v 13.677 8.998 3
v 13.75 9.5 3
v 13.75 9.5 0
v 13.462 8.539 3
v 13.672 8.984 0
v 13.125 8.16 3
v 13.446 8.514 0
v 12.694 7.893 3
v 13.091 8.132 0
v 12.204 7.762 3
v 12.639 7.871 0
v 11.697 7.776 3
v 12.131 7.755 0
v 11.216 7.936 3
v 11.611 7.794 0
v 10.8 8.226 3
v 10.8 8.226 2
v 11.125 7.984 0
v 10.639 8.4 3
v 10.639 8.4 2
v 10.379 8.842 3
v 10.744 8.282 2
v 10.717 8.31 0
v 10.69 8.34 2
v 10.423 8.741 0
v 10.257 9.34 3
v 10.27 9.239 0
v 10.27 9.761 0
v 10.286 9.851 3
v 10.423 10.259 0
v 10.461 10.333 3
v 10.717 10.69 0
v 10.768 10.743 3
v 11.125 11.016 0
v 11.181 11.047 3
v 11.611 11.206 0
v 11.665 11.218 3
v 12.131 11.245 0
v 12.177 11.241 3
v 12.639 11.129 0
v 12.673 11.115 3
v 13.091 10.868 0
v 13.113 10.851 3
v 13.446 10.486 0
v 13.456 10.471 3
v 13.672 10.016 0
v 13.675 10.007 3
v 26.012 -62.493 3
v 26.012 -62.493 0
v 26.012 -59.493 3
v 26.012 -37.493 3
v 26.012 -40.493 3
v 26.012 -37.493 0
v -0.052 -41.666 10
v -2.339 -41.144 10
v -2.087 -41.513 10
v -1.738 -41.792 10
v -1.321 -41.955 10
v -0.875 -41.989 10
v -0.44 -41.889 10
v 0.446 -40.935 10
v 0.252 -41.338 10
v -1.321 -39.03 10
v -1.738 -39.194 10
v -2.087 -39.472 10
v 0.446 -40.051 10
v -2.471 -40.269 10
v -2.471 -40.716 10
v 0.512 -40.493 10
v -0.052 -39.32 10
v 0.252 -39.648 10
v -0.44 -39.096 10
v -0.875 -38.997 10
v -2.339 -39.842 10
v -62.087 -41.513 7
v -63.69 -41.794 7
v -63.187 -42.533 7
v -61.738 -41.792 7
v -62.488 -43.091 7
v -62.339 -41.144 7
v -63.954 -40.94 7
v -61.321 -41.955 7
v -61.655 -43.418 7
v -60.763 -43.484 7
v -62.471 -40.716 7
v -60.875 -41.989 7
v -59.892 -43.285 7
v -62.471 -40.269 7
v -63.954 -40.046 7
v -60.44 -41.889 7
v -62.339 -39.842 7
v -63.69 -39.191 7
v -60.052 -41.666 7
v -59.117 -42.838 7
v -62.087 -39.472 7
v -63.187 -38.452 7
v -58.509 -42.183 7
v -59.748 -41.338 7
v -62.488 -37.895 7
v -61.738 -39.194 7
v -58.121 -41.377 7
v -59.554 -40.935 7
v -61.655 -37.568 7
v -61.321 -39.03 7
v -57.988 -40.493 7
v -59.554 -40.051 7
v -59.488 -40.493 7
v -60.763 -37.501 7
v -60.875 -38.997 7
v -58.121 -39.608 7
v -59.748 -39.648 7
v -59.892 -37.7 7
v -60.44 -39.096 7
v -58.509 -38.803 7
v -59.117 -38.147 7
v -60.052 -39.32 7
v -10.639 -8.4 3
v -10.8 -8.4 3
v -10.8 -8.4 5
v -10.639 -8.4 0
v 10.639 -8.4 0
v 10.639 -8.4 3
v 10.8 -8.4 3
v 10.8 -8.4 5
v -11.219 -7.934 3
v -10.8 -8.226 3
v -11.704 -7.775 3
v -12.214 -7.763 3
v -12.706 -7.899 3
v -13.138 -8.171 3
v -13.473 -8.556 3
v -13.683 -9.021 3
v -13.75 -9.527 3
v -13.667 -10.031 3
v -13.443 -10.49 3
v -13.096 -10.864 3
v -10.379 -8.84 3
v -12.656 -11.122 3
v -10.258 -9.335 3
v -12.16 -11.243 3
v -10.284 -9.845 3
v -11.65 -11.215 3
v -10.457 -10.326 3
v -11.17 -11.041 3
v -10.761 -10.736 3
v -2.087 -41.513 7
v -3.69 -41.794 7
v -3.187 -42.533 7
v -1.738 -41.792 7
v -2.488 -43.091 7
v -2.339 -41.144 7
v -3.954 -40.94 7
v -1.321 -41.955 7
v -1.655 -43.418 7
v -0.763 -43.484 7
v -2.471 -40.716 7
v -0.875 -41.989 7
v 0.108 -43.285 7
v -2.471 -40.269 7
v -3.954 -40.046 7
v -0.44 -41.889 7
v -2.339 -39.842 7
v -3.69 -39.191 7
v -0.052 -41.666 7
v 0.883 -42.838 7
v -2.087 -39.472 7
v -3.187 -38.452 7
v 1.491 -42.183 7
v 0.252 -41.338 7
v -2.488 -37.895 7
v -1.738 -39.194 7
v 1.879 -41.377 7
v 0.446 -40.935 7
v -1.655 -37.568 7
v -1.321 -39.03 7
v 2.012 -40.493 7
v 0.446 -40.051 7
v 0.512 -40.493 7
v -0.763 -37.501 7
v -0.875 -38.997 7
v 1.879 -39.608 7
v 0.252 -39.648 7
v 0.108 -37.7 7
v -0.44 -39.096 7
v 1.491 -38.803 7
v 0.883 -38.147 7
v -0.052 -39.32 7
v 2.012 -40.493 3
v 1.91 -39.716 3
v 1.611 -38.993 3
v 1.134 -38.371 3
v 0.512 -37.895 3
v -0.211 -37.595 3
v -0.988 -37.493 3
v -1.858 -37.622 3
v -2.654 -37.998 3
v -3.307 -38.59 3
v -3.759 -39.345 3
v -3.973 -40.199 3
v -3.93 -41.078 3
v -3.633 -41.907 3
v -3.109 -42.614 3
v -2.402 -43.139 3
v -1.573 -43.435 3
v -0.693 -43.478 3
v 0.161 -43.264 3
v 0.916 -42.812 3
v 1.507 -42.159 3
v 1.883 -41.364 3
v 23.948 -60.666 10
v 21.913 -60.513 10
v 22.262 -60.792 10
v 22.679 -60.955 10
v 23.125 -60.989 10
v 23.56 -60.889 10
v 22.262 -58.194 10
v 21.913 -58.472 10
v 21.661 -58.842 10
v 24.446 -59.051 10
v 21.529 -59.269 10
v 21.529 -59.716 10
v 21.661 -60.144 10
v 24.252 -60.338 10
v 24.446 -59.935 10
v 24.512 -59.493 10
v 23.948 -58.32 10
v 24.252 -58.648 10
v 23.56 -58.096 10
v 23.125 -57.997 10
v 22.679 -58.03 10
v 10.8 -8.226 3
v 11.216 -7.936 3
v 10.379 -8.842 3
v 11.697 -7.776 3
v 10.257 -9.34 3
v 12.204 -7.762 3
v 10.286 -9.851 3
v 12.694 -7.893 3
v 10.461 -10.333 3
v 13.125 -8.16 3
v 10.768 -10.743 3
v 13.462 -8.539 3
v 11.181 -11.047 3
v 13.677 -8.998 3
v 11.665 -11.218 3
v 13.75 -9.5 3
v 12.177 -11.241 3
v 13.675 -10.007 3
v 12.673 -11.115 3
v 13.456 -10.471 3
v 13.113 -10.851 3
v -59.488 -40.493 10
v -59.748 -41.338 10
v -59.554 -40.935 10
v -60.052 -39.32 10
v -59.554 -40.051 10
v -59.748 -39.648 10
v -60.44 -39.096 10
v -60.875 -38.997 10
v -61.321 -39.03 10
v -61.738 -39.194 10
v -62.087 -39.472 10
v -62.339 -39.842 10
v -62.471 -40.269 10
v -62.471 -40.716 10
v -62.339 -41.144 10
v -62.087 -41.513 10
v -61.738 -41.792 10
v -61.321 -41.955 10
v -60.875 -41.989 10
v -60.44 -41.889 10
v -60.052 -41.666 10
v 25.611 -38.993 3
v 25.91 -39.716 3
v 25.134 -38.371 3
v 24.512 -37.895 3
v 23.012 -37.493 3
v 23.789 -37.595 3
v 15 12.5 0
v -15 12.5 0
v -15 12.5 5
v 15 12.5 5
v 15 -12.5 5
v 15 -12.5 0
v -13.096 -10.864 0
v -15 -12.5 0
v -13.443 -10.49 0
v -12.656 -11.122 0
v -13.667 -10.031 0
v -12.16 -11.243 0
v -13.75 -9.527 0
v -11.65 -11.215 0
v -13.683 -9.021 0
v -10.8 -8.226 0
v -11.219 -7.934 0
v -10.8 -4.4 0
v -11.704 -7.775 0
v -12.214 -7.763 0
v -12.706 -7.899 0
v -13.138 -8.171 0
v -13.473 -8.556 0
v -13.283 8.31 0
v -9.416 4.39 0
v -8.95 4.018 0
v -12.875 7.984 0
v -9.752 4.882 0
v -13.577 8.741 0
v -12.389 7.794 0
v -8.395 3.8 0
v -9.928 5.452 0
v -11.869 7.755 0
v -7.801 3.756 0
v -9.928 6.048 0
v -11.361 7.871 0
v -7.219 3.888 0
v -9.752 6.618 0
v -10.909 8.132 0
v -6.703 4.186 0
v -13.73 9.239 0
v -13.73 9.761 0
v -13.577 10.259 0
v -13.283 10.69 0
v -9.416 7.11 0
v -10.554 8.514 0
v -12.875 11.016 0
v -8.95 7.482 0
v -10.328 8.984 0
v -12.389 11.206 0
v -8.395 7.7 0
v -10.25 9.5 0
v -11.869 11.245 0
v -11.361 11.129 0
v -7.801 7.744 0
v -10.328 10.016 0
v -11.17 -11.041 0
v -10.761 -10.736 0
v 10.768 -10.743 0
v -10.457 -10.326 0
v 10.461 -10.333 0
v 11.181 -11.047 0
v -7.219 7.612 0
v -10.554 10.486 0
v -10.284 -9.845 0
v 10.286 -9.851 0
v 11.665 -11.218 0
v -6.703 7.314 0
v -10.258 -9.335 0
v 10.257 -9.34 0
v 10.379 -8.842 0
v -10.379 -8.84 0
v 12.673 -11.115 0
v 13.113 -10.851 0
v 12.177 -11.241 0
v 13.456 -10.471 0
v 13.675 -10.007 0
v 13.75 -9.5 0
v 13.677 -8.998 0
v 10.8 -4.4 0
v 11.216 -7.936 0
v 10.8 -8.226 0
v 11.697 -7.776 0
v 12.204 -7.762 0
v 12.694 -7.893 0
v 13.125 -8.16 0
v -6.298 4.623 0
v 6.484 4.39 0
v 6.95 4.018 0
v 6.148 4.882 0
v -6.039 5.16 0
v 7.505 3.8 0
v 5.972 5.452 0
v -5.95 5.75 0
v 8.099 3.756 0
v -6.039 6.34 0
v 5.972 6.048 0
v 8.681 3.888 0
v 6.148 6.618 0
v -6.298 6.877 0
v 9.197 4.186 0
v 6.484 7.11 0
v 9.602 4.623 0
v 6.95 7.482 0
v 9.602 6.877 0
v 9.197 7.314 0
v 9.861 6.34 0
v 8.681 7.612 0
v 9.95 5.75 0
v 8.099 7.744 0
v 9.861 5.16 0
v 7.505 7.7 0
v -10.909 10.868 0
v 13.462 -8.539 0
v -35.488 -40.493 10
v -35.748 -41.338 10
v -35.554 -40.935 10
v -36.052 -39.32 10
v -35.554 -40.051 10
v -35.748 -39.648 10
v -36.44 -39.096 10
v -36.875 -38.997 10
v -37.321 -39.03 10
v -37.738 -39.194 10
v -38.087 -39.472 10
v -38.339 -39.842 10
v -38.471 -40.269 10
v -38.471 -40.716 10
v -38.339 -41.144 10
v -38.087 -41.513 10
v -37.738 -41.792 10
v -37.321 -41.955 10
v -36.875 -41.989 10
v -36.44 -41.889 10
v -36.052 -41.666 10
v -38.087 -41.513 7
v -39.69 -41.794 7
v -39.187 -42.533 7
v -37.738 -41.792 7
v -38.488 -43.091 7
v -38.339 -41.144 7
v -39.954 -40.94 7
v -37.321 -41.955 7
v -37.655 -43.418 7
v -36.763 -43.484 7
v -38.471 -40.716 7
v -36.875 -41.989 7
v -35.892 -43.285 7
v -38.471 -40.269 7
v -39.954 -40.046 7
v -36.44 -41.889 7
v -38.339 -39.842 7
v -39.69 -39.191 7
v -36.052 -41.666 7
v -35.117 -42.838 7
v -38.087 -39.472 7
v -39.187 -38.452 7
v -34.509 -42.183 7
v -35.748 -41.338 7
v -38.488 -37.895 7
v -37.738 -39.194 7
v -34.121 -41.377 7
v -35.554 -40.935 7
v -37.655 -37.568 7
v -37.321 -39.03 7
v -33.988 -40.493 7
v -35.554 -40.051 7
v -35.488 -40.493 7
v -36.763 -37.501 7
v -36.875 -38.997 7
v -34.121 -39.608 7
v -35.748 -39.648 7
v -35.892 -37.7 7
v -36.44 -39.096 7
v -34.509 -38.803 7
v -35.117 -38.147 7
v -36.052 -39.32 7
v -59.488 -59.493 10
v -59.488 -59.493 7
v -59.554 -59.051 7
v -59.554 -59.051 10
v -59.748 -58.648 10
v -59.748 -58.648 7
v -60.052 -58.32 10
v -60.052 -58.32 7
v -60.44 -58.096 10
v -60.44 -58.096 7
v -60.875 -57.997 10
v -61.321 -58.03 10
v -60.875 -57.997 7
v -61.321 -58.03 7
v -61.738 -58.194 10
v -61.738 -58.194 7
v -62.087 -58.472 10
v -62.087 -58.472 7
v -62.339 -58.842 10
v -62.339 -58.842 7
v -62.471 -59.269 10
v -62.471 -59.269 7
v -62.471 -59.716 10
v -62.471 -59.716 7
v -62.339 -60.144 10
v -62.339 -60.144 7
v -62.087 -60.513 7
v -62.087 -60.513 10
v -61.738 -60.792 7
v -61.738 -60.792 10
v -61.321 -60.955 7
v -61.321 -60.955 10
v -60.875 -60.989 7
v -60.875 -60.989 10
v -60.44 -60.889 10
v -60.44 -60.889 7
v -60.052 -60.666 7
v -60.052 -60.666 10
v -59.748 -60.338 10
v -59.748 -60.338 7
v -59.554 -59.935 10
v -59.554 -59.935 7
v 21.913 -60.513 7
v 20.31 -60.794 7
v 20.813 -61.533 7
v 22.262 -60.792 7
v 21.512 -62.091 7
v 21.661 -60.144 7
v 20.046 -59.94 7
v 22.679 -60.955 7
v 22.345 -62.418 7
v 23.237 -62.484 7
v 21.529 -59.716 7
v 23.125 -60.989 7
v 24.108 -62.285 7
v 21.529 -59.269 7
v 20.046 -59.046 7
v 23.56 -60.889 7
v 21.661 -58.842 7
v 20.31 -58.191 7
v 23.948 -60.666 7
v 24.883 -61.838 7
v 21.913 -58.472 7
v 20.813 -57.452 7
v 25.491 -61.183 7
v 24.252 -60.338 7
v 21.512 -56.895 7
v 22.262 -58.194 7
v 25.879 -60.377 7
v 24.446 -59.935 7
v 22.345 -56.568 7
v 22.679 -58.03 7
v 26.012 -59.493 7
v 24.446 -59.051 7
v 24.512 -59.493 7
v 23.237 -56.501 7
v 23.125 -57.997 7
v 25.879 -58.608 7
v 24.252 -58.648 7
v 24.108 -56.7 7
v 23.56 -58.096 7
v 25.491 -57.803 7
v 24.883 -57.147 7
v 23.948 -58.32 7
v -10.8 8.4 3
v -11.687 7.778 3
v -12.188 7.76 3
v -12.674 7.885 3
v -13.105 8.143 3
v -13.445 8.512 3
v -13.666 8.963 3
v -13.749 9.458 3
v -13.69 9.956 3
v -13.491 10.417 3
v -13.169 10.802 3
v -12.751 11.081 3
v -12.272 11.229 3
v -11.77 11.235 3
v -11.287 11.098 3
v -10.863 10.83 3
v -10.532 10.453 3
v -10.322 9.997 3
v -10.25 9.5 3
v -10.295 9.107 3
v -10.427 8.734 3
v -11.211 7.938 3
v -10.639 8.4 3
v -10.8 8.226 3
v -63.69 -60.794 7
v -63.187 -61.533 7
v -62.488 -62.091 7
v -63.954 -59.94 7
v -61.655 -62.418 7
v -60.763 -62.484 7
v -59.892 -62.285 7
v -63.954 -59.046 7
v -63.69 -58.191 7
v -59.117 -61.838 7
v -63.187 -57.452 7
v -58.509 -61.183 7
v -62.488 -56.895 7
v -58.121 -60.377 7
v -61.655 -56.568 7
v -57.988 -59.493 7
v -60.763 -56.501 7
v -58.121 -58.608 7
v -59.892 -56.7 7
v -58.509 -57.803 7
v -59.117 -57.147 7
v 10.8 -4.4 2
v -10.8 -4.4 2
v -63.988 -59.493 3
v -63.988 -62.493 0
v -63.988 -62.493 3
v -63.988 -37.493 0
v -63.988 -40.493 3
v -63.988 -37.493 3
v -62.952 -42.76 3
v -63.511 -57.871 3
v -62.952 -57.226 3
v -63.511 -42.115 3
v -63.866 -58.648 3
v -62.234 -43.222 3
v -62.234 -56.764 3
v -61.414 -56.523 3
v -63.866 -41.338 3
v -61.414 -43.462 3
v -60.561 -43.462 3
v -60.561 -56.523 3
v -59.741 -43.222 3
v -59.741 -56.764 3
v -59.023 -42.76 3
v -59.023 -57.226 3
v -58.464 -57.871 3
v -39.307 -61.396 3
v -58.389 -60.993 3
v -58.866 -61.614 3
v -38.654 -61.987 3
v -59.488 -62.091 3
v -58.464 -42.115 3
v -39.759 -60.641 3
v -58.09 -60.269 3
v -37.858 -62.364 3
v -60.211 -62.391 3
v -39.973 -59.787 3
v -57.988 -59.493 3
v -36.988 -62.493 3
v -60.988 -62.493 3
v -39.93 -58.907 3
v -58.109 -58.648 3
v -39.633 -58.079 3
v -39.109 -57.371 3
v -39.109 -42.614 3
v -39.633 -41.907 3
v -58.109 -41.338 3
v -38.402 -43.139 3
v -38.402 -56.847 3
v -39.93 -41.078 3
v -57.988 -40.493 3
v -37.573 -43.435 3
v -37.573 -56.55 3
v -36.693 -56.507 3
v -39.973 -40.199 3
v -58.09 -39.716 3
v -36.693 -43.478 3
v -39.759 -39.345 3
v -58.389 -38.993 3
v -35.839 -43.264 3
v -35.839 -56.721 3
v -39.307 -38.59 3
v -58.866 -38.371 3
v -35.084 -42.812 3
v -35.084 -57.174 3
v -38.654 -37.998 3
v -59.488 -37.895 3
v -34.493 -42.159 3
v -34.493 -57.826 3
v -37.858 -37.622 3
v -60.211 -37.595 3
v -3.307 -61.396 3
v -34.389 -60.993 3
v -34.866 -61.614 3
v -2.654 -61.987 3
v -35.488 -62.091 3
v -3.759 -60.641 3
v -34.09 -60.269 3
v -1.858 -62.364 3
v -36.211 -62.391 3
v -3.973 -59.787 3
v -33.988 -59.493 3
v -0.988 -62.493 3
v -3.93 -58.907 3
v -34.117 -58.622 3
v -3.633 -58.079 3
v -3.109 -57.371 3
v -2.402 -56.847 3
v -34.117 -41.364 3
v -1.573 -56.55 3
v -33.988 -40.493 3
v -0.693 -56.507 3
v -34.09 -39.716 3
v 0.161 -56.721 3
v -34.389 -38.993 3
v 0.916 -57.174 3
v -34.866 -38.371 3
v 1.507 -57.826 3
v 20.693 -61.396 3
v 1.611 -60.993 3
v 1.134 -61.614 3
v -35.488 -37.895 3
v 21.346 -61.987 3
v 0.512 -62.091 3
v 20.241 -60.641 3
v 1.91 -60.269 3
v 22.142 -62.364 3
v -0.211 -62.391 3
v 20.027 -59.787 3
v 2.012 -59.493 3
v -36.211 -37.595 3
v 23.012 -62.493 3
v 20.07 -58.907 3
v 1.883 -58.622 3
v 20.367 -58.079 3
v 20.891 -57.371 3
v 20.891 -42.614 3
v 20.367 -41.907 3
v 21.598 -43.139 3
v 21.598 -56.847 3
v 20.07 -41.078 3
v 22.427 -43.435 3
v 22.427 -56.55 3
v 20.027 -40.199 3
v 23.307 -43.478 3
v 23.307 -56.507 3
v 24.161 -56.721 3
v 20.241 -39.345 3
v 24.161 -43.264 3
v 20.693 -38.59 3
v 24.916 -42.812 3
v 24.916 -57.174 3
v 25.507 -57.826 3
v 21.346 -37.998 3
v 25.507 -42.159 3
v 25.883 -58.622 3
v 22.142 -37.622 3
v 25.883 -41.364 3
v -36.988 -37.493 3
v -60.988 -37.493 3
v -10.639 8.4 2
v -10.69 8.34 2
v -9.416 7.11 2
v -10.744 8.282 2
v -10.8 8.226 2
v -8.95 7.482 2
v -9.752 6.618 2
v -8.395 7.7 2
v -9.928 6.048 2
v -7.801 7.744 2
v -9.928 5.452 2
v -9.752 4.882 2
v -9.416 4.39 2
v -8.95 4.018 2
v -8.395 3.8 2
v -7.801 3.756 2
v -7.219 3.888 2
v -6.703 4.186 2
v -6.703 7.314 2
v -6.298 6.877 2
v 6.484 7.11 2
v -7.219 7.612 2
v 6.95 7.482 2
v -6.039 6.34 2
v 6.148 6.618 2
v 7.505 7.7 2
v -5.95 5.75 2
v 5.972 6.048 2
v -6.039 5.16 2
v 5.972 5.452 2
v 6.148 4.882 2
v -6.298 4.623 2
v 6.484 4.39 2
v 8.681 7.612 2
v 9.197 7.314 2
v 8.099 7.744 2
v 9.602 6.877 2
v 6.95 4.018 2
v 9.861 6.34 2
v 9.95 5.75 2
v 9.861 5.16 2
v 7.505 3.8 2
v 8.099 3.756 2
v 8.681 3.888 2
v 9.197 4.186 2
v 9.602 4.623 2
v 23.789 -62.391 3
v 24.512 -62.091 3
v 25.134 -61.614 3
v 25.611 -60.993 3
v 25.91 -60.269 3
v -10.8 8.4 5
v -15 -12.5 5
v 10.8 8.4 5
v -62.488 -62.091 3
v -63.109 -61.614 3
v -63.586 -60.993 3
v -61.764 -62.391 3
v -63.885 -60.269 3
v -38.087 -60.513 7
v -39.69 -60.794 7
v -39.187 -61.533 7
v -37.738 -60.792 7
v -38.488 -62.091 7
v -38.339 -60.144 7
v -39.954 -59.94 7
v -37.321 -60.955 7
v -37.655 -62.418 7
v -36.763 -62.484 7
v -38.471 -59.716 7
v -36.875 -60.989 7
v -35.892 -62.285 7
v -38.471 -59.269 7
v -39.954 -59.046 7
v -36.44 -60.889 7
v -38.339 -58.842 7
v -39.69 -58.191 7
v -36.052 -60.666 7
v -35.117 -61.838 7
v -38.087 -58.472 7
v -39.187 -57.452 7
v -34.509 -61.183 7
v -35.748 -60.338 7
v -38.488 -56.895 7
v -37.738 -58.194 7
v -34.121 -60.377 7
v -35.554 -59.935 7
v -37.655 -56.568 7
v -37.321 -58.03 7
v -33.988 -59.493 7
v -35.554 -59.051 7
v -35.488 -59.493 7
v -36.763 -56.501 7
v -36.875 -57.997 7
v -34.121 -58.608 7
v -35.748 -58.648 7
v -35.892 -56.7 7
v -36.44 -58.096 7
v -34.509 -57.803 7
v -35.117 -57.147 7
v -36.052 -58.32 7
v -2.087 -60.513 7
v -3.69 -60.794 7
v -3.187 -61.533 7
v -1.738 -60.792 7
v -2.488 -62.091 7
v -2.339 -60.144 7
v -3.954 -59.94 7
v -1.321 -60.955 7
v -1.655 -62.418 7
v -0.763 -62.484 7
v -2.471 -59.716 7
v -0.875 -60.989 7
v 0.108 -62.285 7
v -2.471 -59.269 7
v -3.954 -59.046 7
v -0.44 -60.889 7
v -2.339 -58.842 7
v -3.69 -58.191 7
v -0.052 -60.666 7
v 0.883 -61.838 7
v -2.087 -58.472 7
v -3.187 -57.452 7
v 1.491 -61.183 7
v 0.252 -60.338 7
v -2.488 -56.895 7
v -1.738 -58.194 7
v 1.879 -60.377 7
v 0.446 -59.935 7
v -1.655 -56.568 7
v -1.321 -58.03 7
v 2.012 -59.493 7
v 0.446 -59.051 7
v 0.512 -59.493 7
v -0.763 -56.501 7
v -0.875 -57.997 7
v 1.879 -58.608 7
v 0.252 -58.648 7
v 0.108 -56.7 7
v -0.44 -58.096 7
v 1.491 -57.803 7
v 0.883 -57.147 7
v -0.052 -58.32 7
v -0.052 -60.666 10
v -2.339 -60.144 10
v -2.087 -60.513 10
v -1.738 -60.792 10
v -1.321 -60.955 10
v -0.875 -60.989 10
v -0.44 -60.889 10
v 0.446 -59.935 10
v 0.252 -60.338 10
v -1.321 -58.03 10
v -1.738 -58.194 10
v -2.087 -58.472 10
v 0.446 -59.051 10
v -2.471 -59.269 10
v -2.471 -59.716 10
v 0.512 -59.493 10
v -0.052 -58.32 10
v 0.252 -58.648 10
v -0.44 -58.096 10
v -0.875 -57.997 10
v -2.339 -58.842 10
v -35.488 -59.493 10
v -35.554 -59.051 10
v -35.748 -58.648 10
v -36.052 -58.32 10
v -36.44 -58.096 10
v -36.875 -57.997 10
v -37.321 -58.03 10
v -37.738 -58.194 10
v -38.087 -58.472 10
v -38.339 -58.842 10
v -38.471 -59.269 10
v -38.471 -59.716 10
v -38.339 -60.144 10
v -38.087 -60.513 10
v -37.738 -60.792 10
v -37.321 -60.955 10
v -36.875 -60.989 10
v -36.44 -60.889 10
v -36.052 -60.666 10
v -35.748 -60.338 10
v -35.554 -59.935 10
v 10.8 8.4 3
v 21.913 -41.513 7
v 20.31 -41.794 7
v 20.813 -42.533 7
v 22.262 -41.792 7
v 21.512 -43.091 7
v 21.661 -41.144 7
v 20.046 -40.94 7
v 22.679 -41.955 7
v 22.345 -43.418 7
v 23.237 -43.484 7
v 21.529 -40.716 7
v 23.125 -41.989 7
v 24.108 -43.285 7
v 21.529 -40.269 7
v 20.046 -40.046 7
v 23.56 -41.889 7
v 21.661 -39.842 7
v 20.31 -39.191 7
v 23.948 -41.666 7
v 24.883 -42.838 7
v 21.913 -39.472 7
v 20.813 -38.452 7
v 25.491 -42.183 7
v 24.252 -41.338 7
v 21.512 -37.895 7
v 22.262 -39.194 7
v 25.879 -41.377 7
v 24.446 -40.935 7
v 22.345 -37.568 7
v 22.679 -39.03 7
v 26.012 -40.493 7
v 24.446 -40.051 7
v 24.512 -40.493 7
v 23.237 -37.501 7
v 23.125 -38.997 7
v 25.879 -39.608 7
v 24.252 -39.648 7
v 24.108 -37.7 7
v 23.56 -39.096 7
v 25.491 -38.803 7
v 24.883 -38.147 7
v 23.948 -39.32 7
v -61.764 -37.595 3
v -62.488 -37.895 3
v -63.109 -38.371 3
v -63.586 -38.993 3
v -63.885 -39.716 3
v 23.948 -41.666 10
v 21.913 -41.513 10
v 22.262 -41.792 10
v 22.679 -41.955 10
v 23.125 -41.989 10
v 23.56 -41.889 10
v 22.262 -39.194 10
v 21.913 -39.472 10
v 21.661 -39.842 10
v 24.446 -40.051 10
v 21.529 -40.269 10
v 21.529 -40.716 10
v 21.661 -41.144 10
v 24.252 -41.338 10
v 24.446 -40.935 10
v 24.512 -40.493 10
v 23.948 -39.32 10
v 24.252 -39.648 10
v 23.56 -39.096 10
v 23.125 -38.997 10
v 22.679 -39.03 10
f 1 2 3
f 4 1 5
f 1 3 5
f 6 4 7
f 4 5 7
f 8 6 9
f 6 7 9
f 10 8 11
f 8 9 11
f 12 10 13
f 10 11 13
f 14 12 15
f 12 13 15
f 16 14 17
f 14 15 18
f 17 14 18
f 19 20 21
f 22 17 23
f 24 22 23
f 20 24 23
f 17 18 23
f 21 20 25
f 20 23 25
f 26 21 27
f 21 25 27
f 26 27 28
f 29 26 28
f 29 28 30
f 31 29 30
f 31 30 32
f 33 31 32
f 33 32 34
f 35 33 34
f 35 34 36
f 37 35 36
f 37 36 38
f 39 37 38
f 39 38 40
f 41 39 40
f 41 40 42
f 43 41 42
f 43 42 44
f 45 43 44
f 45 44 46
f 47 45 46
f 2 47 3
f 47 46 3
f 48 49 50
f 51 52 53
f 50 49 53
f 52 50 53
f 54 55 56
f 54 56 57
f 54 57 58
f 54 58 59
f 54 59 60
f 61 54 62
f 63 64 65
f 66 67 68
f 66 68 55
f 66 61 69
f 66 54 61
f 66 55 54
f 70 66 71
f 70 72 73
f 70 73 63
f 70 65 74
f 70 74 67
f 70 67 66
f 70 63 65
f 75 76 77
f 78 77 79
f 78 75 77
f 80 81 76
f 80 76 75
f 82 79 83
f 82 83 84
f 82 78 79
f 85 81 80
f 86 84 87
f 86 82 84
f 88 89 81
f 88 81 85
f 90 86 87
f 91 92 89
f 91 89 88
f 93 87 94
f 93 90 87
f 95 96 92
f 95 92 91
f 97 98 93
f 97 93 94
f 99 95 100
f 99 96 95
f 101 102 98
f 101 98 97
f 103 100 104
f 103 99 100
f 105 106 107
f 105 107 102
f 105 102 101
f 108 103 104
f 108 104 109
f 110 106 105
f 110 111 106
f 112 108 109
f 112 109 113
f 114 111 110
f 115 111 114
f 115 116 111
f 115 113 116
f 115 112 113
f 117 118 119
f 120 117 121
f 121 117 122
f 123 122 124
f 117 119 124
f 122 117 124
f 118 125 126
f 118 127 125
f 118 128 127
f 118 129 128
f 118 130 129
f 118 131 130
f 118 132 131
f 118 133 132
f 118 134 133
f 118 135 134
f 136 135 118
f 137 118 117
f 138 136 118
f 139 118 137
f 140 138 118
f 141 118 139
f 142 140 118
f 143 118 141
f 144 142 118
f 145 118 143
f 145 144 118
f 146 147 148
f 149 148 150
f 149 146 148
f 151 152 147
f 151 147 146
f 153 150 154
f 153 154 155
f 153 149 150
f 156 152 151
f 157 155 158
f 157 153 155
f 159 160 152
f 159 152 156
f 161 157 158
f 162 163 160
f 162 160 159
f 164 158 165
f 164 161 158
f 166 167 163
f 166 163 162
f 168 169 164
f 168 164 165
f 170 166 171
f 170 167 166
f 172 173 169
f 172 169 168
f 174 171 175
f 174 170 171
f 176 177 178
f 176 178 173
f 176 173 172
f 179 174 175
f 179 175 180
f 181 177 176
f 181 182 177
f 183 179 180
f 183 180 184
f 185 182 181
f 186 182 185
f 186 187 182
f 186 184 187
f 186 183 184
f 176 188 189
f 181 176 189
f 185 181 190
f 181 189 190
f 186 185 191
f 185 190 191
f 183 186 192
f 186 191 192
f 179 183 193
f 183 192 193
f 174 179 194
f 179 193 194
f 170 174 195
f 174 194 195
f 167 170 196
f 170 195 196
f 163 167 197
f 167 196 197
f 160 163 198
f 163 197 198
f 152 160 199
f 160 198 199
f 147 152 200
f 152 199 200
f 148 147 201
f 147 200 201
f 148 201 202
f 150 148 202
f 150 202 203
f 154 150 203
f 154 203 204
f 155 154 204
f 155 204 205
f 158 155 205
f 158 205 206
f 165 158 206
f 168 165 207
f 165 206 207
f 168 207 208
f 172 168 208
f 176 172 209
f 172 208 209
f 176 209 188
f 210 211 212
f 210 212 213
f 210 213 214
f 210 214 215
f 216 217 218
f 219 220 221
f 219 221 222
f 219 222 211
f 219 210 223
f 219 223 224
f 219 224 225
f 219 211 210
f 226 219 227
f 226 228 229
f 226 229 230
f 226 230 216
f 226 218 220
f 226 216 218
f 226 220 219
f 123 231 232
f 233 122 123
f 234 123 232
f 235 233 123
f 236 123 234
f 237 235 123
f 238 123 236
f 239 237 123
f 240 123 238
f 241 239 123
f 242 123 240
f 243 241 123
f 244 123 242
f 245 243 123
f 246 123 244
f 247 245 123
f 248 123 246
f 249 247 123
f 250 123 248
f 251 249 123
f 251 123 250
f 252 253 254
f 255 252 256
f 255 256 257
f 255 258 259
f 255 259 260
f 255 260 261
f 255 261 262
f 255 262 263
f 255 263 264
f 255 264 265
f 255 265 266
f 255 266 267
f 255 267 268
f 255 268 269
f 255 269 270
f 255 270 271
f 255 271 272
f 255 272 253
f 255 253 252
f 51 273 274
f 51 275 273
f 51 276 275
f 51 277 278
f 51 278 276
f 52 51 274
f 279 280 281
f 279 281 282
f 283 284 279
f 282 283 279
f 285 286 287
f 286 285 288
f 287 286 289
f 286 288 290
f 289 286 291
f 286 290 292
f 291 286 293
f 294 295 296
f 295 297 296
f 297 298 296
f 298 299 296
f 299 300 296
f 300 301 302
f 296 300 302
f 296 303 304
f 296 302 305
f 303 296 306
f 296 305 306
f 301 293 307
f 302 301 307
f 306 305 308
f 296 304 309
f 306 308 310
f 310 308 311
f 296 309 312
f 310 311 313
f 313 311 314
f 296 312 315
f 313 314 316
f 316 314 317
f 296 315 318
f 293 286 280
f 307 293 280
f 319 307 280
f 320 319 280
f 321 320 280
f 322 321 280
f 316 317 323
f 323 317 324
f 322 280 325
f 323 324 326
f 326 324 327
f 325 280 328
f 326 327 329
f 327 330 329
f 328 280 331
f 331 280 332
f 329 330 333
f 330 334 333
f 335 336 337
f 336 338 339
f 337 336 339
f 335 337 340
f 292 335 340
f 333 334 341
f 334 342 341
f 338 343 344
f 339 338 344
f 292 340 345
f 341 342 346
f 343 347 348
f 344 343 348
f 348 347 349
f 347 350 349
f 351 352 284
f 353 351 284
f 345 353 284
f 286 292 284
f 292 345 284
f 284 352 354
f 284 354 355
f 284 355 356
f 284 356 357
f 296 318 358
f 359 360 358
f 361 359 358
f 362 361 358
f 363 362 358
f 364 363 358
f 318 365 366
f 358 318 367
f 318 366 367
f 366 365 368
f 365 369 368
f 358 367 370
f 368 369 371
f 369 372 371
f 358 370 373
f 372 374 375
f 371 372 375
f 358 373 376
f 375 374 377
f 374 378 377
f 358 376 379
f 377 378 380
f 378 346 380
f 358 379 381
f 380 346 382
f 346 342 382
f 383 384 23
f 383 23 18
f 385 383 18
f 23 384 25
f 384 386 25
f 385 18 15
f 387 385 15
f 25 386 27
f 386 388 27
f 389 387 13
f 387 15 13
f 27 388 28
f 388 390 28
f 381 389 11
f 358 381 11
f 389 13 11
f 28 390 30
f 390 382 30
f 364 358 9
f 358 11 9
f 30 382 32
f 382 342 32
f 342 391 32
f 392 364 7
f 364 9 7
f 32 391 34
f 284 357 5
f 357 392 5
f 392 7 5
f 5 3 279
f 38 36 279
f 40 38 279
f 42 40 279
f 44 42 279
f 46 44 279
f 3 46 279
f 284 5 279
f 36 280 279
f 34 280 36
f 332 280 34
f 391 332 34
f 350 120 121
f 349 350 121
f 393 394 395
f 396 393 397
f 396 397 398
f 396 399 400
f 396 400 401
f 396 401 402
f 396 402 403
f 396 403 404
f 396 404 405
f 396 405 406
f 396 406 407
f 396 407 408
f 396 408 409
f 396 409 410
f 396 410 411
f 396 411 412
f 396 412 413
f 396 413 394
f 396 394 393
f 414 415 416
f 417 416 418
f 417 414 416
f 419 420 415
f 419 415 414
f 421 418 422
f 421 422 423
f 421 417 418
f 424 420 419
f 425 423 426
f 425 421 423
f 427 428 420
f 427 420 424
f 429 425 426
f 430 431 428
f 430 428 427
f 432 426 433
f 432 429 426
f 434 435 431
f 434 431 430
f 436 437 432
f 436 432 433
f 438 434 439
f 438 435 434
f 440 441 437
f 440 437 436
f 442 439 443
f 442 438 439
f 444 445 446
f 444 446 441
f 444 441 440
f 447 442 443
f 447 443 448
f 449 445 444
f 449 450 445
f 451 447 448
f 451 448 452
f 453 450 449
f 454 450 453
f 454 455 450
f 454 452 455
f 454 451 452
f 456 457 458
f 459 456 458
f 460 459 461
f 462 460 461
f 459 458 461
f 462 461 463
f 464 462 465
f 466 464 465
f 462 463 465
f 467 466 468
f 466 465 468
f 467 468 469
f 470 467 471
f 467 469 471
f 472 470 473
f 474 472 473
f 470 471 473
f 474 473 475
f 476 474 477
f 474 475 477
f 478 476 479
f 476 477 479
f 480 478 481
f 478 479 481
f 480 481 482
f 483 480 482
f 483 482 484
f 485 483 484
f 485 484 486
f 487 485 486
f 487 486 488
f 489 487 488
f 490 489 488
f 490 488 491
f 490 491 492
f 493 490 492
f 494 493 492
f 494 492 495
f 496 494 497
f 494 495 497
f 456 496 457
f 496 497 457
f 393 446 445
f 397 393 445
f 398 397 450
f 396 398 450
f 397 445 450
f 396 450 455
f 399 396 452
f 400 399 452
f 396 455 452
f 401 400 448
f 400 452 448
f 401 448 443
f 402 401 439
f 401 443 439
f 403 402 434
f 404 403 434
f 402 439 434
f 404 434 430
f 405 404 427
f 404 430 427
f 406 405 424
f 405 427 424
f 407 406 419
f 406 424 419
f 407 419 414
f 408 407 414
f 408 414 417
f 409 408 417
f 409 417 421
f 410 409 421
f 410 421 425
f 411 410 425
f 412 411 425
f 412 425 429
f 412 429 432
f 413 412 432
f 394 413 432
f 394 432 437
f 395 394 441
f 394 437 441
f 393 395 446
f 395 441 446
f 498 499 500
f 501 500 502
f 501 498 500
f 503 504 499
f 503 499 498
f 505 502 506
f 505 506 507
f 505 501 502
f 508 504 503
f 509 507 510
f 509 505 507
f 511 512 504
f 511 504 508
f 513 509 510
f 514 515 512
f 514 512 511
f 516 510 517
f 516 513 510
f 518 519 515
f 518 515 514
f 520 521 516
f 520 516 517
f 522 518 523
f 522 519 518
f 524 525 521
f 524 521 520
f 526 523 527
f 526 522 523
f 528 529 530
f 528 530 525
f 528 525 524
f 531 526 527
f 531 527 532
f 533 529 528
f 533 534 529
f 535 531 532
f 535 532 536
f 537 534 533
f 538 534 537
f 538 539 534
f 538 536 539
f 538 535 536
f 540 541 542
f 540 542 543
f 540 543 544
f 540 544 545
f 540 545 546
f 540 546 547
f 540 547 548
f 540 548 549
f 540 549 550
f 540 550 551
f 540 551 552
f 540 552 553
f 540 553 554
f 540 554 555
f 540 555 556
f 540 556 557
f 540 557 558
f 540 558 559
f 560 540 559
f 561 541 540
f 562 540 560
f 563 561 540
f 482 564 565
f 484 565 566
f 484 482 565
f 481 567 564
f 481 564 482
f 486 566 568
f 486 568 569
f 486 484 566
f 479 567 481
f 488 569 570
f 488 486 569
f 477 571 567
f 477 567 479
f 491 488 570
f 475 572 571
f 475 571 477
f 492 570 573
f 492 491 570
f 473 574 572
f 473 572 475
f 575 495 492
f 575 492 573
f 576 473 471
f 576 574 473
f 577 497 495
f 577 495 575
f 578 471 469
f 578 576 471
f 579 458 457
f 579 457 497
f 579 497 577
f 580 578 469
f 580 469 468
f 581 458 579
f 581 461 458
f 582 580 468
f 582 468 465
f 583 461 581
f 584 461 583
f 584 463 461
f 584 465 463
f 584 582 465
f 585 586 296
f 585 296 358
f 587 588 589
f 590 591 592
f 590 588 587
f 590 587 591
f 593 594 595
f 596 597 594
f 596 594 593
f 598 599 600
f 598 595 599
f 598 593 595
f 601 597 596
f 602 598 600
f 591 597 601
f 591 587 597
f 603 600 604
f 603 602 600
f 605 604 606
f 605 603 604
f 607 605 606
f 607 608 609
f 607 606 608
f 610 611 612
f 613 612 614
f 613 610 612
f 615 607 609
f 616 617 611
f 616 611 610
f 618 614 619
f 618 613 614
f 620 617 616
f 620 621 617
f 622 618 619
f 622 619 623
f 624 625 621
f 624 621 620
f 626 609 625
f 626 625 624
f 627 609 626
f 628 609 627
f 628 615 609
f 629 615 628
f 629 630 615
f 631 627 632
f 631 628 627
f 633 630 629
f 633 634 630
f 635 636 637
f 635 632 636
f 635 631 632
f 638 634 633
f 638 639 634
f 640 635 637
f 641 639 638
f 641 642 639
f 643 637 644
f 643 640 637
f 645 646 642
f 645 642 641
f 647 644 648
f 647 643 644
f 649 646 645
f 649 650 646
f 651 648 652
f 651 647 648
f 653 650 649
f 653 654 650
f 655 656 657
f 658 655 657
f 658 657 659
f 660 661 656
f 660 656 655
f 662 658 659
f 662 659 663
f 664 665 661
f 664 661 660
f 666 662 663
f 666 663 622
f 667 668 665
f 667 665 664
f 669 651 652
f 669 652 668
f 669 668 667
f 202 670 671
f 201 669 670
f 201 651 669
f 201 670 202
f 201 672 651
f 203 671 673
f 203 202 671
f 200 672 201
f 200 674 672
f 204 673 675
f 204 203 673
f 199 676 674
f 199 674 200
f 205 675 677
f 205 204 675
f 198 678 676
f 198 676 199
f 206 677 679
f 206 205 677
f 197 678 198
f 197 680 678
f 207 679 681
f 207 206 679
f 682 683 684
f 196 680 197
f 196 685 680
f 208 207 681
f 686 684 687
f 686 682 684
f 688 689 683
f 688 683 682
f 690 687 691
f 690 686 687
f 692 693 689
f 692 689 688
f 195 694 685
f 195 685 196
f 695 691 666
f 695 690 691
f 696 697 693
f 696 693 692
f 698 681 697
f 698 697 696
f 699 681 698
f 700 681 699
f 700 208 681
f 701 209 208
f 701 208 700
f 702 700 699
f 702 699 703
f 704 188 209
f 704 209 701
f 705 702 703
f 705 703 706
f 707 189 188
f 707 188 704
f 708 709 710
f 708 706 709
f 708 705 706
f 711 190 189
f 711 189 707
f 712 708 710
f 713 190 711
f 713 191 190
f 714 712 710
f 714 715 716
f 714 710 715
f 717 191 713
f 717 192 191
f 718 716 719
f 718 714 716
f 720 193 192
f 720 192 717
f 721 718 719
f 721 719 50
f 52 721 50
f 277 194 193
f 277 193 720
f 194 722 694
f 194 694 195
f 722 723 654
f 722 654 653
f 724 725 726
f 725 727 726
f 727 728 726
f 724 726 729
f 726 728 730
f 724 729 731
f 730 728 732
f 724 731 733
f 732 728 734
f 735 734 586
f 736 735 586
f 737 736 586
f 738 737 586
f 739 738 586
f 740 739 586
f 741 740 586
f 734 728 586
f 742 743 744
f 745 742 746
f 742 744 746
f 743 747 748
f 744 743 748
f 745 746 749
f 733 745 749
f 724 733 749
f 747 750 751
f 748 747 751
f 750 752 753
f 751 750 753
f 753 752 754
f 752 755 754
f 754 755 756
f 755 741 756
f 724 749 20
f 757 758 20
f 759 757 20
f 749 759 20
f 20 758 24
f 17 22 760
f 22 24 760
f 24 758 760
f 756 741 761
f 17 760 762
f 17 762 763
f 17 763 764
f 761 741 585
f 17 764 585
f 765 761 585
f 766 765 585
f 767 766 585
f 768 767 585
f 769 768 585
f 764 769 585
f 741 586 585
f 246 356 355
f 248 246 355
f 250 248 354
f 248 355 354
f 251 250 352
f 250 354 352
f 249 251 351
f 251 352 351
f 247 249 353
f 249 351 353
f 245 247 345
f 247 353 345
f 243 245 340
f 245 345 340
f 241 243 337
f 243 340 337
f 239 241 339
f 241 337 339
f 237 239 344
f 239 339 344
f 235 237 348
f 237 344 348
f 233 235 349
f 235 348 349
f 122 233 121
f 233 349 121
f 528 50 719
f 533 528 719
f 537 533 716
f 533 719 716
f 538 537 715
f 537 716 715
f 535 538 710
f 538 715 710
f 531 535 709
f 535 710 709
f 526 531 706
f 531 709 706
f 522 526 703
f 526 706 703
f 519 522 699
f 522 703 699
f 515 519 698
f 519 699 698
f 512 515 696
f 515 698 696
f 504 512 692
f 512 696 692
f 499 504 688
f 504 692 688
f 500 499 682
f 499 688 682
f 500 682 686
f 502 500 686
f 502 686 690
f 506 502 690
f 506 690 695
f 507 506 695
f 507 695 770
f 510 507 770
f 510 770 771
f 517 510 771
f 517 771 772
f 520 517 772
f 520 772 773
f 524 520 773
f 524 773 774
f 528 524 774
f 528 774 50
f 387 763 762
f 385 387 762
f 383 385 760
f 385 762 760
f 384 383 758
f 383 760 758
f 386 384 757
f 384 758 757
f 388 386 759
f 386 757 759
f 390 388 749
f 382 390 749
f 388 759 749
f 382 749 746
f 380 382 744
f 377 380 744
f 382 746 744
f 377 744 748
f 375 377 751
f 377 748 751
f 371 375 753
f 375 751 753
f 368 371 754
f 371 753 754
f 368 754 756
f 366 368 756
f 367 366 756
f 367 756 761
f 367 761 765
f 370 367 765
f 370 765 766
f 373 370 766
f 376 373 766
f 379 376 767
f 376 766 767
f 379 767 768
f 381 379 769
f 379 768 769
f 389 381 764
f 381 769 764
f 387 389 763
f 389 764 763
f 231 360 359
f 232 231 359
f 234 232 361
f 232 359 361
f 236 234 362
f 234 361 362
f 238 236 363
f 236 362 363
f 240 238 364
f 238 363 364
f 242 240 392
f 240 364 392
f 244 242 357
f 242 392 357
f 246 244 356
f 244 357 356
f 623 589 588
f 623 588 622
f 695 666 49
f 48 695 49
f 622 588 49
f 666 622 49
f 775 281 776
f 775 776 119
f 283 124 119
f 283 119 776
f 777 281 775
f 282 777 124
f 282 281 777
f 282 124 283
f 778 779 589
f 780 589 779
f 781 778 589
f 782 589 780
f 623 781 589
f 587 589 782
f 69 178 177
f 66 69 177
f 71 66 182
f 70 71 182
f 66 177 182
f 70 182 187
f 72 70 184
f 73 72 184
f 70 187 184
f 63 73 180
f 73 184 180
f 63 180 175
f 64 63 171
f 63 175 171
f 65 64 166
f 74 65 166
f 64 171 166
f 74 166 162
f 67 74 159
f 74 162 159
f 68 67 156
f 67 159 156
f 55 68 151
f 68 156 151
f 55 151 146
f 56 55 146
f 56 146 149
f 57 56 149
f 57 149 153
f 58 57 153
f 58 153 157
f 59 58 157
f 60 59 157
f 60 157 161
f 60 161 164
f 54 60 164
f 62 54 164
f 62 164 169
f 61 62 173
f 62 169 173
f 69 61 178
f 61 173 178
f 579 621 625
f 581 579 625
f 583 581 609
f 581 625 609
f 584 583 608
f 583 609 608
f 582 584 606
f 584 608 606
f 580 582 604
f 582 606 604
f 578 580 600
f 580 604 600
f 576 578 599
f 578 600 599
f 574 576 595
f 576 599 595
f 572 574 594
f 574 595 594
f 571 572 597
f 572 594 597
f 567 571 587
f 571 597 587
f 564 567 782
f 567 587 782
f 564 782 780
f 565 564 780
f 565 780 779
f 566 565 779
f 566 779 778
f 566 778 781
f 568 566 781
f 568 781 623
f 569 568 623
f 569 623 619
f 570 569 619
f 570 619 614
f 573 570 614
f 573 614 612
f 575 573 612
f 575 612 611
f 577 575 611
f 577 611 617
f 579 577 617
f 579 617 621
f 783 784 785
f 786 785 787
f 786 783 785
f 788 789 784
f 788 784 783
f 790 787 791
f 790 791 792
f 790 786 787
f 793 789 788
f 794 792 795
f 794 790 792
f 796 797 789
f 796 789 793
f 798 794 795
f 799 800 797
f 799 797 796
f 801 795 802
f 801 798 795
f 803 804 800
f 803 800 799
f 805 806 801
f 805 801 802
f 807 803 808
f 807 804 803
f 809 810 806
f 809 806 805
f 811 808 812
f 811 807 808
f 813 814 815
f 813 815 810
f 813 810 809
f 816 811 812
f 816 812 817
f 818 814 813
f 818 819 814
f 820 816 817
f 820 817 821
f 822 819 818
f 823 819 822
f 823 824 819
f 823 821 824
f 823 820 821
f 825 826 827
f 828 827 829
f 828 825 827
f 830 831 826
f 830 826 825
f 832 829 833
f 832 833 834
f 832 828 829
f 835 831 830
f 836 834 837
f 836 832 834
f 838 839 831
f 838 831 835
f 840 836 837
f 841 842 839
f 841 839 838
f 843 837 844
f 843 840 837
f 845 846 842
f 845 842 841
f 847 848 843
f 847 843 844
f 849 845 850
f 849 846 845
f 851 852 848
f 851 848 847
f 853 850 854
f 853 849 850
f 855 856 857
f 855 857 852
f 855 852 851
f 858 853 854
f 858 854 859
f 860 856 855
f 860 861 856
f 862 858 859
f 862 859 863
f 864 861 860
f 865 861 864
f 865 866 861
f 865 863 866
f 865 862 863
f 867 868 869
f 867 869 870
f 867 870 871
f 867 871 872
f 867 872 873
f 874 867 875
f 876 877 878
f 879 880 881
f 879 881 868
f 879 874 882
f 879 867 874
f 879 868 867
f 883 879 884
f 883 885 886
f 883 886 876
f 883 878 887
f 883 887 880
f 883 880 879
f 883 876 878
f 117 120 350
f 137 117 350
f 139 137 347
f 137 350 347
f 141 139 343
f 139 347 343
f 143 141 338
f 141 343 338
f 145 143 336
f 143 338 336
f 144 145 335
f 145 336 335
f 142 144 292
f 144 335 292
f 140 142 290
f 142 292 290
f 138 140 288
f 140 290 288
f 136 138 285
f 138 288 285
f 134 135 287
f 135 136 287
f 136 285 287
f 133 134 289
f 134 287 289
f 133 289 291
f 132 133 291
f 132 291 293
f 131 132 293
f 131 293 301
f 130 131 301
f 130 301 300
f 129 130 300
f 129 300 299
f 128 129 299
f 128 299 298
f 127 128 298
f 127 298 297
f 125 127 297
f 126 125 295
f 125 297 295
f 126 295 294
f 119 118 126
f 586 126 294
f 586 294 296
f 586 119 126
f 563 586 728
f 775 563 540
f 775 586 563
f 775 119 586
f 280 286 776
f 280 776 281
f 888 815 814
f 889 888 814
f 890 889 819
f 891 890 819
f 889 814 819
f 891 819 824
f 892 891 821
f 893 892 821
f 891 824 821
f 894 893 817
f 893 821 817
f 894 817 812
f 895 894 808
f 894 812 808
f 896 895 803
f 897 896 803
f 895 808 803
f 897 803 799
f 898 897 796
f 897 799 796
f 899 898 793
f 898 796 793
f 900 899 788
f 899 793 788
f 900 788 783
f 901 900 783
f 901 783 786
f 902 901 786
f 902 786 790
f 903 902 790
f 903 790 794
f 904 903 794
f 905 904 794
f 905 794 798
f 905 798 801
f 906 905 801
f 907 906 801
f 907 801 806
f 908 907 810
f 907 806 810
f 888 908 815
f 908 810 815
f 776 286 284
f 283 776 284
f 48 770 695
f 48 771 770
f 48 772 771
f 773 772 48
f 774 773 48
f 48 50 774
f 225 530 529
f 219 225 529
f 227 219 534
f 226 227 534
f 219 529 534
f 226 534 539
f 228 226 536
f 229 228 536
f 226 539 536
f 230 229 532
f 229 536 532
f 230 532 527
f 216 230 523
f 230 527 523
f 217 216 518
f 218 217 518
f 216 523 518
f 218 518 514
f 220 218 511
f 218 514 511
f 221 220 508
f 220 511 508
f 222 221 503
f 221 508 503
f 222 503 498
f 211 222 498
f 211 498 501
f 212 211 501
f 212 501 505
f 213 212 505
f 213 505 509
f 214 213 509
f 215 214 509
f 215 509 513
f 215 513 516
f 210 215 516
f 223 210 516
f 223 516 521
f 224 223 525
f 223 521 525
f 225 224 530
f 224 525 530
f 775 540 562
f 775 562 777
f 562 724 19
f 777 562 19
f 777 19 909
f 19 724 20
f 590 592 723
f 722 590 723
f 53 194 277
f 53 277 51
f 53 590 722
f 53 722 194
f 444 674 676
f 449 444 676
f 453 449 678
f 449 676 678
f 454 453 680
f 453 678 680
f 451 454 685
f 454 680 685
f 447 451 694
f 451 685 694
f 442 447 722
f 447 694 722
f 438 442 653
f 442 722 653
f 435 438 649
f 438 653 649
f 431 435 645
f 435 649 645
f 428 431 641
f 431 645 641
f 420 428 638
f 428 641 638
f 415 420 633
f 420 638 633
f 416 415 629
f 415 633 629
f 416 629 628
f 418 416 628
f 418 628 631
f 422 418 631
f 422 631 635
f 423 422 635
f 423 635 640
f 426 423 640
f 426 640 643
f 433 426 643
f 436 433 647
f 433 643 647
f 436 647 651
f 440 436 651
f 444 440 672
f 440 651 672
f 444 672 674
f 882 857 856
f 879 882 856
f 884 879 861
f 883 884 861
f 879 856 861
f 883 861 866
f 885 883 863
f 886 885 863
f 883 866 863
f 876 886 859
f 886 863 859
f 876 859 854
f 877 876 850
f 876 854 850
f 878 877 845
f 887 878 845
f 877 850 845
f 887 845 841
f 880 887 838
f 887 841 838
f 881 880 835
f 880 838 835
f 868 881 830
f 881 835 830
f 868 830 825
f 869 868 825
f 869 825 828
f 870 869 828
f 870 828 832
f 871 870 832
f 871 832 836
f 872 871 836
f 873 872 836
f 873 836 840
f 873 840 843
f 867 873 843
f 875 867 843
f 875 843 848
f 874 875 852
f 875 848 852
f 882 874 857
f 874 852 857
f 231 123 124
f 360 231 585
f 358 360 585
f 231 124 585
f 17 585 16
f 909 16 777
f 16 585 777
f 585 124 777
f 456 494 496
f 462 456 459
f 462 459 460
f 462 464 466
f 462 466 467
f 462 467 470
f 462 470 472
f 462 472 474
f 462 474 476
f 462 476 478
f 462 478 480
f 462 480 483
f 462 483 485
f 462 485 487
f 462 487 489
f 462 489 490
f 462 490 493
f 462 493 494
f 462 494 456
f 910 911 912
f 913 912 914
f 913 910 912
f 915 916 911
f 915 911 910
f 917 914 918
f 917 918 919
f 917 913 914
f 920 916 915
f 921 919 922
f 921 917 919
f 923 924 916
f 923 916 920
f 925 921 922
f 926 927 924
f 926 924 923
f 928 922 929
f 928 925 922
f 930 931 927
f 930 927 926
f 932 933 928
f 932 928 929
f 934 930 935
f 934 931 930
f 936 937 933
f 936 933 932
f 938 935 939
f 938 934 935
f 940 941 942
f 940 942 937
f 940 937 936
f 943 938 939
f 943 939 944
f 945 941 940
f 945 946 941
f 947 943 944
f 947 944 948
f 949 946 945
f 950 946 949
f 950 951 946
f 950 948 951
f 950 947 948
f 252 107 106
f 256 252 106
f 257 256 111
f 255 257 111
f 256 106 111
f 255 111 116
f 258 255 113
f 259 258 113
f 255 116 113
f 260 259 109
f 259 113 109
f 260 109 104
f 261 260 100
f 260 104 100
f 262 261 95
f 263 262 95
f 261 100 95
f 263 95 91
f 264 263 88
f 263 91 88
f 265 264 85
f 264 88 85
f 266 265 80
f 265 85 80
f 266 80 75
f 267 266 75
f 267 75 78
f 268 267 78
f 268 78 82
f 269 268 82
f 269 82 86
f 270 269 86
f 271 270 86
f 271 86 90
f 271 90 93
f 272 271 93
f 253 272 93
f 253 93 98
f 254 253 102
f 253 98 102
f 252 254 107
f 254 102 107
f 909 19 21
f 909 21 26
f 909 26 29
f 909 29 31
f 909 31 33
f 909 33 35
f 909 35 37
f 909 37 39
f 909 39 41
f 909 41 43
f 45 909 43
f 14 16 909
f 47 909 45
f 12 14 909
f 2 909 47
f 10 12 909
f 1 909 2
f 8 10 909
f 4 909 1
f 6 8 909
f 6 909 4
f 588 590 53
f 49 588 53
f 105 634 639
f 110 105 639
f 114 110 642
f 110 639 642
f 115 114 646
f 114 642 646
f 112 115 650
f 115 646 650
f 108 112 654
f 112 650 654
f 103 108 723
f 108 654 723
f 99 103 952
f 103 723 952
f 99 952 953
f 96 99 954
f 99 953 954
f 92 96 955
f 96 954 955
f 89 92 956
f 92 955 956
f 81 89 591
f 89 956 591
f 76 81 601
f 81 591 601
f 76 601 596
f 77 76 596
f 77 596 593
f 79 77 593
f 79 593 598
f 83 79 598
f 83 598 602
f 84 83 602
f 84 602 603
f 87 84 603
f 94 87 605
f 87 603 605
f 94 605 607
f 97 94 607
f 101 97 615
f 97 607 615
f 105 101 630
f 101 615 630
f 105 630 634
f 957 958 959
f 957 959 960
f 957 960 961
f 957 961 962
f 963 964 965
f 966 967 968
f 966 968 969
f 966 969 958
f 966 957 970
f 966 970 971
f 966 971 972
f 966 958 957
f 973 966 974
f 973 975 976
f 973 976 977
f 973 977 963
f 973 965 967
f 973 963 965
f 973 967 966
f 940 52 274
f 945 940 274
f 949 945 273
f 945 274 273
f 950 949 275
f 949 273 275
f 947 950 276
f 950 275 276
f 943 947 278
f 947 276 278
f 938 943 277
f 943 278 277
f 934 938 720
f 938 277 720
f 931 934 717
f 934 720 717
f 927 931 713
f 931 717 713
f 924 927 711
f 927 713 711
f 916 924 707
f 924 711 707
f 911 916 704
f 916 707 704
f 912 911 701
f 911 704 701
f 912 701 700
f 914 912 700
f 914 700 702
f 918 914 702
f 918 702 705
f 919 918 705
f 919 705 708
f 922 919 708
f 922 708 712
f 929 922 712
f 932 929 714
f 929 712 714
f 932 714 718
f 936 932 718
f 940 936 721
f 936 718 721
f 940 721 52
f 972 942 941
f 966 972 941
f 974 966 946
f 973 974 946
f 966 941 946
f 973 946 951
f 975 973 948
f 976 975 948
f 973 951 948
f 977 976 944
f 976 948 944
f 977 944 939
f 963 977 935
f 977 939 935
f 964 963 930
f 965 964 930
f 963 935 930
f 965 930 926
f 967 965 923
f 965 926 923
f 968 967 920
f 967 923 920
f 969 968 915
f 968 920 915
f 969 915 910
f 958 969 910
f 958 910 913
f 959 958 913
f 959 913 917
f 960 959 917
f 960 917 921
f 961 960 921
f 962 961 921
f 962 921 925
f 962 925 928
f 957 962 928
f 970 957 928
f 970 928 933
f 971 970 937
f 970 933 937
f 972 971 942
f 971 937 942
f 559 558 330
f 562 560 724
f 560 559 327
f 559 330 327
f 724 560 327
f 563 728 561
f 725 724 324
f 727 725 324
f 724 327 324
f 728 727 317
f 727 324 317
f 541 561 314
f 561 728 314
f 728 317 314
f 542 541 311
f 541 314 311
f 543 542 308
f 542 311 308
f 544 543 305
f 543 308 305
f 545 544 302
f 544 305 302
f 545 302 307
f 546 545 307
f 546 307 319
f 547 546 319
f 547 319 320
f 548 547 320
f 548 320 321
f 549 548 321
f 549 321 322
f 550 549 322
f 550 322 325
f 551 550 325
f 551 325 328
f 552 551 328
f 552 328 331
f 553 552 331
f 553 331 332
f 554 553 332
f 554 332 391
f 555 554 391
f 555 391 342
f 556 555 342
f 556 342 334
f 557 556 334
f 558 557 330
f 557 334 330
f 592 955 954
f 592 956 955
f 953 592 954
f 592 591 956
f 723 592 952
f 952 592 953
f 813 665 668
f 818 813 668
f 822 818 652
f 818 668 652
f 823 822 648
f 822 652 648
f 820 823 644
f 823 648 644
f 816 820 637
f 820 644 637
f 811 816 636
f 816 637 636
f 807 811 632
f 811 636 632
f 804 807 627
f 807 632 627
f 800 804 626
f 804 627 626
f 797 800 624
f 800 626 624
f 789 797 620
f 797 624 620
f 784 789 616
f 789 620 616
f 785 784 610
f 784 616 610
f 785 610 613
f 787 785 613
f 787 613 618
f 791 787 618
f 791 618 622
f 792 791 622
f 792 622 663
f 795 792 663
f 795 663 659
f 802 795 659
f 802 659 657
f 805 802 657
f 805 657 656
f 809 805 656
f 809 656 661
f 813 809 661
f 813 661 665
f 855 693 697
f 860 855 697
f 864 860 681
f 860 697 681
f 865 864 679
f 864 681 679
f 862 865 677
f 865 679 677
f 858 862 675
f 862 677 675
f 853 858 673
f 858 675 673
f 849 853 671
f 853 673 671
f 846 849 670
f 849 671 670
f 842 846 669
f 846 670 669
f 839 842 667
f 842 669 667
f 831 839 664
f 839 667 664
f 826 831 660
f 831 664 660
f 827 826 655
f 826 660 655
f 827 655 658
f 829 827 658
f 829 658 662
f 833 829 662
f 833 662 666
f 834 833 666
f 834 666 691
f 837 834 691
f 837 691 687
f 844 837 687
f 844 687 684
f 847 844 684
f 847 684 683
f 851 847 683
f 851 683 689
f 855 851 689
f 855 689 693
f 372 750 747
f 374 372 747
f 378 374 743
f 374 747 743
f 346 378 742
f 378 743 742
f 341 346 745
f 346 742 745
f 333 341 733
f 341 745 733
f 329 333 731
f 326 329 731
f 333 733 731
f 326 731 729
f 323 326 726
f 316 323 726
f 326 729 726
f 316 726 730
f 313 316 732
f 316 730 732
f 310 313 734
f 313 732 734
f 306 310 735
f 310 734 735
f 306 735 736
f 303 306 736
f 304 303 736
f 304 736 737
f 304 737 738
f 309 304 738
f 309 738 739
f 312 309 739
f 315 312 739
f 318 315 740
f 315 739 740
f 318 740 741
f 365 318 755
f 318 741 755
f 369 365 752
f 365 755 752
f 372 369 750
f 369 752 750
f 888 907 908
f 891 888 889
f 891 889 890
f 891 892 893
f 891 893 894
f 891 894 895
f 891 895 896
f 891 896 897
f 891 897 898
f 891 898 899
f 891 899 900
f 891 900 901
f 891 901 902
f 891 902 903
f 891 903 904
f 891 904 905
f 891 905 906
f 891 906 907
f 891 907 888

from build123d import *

# Parameters (mm, degrees)
F0_W      = 30
F0_H      = 25
F0_W_2    = 21.6
F0_H_2    = 16.8
F1_DEPTH  = 5
F2_W      = 30
F2_H      = 25
F3_DEPTH  = 2
F4_W      = 21.6
F4_H      = 4
F5_DEPTH  = 2
F6_R      = 2
F7_DEPTH  = 2
F8_W      = 90
F8_H      = 25
F9_DEPTH  = 3
F10_R     = 3
F11_DEPTH = 4
F12_R     = 1.75
F13_DEPTH = 3
F14_R     = 1.5
F15_DEPTH = 3


with BuildPart() as f1:
    # F0 (on Top) → F1 (new body)
    with BuildSketch(Plane.XY):
        Rectangle(F0_W, F0_H)
        Rectangle(F0_W_2, F0_H_2, mode=Mode.SUBTRACT)
    extrude(amount=F1_DEPTH)

    # F2 (on face) → F3 (join)
    with BuildSketch(Plane(origin=(0, 0, 0), x_dir=(1, 0, 0), z_dir=(0, 0, -1))):
        Rectangle(F2_W, F2_H)
    extrude(amount=-F3_DEPTH)

    # F4 (on face) → F5 (cut, through all)
    with BuildSketch(Plane.XY.offset(2)):
        with Locations((0, -6.4)):
            Rectangle(F4_W, F4_H)
    extrude(amount=-F5_DEPTH, mode=Mode.SUBTRACT)

    # F6 (on face) → F7 (cut, through all)
    with BuildSketch(Plane.XY.offset(2)):
        with Locations((-7.95, 5.75)):
            Circle(F6_R)
        with Locations((7.95, 5.75)):
            Circle(F6_R)
    extrude(amount=-F7_DEPTH, mode=Mode.SUBTRACT)

    # F12 (on face) → F13 (cut)
    with BuildSketch(Plane(origin=(0, 0, 0), x_dir=(1, 0, 0), z_dir=(0, 0, -1))):
        with Locations((-12, 9.5)):
            Circle(F12_R)
        with Locations((12, 9.5)):
            Circle(F12_R)
        with Locations((12, -9.5)):
            Circle(F12_R)
        with Locations((-12, -9.5)):
            Circle(F12_R)
    extrude(amount=-F13_DEPTH, mode=Mode.SUBTRACT)


with BuildPart() as f9:
    # F8 (on Top) → F9 (new body)
    with BuildSketch(Plane.XY):
        with Locations((-18.987547, -49.992754)):
            Rectangle(F8_W, F8_H)
    extrude(amount=F9_DEPTH)

    # F10 (on face) → F11 (join)
    with BuildSketch(Plane.XY.offset(3)):
        with Locations((-60.987547, -40.492754)):
            Circle(F10_R)
        with Locations((-36.987547, -40.492754)):
            Circle(F10_R)
        with Locations((-36.987547, -59.492754)):
            Circle(F10_R)
        with Locations((-60.987547, -59.492754)):
            Circle(F10_R)
        with Locations((-0.987547, -40.492754)):
            Circle(F10_R)
        with Locations((-0.987547, -59.492754)):
            Circle(F10_R)
        with Locations((23.012453, -40.492754)):
            Circle(F10_R)
        with Locations((23.012453, -59.492754)):
            Circle(F10_R)
    extrude(amount=F11_DEPTH)

    # F14 (on face) → F15 (join)
    with BuildSketch(Plane.XY.offset(7)):
        with Locations((-60.987547, -40.492754)):
            Circle(F14_R)
        with Locations((-60.987547, -59.492754)):
            Circle(F14_R)
        with Locations((-36.987547, -40.492754)):
            Circle(F14_R)
        with Locations((-36.987547, -59.492754)):
            Circle(F14_R)
        with Locations((-0.987547, -40.492754)):
            Circle(F14_R)
        with Locations((-0.987547, -59.492754)):
            Circle(F14_R)
        with Locations((23.012453, -40.492754)):
            Circle(F14_R)
        with Locations((23.012453, -59.492754)):
            Circle(F14_R)
    extrude(amount=F15_DEPTH)


solid = Compound([f1.part, f9.part])
